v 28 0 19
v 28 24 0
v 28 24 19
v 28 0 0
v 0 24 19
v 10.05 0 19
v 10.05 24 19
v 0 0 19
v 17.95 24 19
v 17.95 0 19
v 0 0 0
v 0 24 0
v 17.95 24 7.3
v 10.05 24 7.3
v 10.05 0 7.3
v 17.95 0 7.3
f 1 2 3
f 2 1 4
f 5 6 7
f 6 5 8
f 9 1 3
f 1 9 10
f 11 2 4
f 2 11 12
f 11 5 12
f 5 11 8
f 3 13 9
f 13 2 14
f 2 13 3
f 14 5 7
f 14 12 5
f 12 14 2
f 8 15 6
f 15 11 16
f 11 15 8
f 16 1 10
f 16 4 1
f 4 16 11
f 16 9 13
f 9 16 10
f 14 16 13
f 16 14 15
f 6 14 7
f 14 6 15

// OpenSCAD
//SolarSchraubenAdapter3

$fn=72;
to=0.2;
w=28.2-to;
d=24;
h=19;
d1=7.5+to+to;
h1=7.3;

difference()
{
//color([55,55,55], alpha=1)
cube([w,d,h]);

translate([(w-d1)/2,0,h1])
color("green")
cube([d1,d,h-h1]);
}




/*

y=34.5;
y2=14.2;

h1=y2;//14.8+to;
y1=y-y2+to;


hs=52;
hs3=2.8;
hs2=5.5-hs3;
hs1=hs-hs2-hs3;


d2=9.7;
d3=20;
d4=16;

module klotz()
{
translate([w,0,0])
rotate([0,270,0])
linear_extrude(w)
polygon([[0,0],[h1,y2],[0,y2]]);
}

module schraube()
{
    cylinder(h=hs1,d=d1);
    
    translate([0,0,hs1])
    cylinder(h=hs2, d1=d1, d2=d2);
    
    translate([0,0,hs1+hs2])
    cylinder(h=hs3, d1=d3, d2=d4);
}

module sch2()
{
    rotate([45,0,0])
    translate([w/2,10.035,-49.3])
    color("green")
    schraube();
}

difference()
{
    klotz();
    sch2();
}
*/
